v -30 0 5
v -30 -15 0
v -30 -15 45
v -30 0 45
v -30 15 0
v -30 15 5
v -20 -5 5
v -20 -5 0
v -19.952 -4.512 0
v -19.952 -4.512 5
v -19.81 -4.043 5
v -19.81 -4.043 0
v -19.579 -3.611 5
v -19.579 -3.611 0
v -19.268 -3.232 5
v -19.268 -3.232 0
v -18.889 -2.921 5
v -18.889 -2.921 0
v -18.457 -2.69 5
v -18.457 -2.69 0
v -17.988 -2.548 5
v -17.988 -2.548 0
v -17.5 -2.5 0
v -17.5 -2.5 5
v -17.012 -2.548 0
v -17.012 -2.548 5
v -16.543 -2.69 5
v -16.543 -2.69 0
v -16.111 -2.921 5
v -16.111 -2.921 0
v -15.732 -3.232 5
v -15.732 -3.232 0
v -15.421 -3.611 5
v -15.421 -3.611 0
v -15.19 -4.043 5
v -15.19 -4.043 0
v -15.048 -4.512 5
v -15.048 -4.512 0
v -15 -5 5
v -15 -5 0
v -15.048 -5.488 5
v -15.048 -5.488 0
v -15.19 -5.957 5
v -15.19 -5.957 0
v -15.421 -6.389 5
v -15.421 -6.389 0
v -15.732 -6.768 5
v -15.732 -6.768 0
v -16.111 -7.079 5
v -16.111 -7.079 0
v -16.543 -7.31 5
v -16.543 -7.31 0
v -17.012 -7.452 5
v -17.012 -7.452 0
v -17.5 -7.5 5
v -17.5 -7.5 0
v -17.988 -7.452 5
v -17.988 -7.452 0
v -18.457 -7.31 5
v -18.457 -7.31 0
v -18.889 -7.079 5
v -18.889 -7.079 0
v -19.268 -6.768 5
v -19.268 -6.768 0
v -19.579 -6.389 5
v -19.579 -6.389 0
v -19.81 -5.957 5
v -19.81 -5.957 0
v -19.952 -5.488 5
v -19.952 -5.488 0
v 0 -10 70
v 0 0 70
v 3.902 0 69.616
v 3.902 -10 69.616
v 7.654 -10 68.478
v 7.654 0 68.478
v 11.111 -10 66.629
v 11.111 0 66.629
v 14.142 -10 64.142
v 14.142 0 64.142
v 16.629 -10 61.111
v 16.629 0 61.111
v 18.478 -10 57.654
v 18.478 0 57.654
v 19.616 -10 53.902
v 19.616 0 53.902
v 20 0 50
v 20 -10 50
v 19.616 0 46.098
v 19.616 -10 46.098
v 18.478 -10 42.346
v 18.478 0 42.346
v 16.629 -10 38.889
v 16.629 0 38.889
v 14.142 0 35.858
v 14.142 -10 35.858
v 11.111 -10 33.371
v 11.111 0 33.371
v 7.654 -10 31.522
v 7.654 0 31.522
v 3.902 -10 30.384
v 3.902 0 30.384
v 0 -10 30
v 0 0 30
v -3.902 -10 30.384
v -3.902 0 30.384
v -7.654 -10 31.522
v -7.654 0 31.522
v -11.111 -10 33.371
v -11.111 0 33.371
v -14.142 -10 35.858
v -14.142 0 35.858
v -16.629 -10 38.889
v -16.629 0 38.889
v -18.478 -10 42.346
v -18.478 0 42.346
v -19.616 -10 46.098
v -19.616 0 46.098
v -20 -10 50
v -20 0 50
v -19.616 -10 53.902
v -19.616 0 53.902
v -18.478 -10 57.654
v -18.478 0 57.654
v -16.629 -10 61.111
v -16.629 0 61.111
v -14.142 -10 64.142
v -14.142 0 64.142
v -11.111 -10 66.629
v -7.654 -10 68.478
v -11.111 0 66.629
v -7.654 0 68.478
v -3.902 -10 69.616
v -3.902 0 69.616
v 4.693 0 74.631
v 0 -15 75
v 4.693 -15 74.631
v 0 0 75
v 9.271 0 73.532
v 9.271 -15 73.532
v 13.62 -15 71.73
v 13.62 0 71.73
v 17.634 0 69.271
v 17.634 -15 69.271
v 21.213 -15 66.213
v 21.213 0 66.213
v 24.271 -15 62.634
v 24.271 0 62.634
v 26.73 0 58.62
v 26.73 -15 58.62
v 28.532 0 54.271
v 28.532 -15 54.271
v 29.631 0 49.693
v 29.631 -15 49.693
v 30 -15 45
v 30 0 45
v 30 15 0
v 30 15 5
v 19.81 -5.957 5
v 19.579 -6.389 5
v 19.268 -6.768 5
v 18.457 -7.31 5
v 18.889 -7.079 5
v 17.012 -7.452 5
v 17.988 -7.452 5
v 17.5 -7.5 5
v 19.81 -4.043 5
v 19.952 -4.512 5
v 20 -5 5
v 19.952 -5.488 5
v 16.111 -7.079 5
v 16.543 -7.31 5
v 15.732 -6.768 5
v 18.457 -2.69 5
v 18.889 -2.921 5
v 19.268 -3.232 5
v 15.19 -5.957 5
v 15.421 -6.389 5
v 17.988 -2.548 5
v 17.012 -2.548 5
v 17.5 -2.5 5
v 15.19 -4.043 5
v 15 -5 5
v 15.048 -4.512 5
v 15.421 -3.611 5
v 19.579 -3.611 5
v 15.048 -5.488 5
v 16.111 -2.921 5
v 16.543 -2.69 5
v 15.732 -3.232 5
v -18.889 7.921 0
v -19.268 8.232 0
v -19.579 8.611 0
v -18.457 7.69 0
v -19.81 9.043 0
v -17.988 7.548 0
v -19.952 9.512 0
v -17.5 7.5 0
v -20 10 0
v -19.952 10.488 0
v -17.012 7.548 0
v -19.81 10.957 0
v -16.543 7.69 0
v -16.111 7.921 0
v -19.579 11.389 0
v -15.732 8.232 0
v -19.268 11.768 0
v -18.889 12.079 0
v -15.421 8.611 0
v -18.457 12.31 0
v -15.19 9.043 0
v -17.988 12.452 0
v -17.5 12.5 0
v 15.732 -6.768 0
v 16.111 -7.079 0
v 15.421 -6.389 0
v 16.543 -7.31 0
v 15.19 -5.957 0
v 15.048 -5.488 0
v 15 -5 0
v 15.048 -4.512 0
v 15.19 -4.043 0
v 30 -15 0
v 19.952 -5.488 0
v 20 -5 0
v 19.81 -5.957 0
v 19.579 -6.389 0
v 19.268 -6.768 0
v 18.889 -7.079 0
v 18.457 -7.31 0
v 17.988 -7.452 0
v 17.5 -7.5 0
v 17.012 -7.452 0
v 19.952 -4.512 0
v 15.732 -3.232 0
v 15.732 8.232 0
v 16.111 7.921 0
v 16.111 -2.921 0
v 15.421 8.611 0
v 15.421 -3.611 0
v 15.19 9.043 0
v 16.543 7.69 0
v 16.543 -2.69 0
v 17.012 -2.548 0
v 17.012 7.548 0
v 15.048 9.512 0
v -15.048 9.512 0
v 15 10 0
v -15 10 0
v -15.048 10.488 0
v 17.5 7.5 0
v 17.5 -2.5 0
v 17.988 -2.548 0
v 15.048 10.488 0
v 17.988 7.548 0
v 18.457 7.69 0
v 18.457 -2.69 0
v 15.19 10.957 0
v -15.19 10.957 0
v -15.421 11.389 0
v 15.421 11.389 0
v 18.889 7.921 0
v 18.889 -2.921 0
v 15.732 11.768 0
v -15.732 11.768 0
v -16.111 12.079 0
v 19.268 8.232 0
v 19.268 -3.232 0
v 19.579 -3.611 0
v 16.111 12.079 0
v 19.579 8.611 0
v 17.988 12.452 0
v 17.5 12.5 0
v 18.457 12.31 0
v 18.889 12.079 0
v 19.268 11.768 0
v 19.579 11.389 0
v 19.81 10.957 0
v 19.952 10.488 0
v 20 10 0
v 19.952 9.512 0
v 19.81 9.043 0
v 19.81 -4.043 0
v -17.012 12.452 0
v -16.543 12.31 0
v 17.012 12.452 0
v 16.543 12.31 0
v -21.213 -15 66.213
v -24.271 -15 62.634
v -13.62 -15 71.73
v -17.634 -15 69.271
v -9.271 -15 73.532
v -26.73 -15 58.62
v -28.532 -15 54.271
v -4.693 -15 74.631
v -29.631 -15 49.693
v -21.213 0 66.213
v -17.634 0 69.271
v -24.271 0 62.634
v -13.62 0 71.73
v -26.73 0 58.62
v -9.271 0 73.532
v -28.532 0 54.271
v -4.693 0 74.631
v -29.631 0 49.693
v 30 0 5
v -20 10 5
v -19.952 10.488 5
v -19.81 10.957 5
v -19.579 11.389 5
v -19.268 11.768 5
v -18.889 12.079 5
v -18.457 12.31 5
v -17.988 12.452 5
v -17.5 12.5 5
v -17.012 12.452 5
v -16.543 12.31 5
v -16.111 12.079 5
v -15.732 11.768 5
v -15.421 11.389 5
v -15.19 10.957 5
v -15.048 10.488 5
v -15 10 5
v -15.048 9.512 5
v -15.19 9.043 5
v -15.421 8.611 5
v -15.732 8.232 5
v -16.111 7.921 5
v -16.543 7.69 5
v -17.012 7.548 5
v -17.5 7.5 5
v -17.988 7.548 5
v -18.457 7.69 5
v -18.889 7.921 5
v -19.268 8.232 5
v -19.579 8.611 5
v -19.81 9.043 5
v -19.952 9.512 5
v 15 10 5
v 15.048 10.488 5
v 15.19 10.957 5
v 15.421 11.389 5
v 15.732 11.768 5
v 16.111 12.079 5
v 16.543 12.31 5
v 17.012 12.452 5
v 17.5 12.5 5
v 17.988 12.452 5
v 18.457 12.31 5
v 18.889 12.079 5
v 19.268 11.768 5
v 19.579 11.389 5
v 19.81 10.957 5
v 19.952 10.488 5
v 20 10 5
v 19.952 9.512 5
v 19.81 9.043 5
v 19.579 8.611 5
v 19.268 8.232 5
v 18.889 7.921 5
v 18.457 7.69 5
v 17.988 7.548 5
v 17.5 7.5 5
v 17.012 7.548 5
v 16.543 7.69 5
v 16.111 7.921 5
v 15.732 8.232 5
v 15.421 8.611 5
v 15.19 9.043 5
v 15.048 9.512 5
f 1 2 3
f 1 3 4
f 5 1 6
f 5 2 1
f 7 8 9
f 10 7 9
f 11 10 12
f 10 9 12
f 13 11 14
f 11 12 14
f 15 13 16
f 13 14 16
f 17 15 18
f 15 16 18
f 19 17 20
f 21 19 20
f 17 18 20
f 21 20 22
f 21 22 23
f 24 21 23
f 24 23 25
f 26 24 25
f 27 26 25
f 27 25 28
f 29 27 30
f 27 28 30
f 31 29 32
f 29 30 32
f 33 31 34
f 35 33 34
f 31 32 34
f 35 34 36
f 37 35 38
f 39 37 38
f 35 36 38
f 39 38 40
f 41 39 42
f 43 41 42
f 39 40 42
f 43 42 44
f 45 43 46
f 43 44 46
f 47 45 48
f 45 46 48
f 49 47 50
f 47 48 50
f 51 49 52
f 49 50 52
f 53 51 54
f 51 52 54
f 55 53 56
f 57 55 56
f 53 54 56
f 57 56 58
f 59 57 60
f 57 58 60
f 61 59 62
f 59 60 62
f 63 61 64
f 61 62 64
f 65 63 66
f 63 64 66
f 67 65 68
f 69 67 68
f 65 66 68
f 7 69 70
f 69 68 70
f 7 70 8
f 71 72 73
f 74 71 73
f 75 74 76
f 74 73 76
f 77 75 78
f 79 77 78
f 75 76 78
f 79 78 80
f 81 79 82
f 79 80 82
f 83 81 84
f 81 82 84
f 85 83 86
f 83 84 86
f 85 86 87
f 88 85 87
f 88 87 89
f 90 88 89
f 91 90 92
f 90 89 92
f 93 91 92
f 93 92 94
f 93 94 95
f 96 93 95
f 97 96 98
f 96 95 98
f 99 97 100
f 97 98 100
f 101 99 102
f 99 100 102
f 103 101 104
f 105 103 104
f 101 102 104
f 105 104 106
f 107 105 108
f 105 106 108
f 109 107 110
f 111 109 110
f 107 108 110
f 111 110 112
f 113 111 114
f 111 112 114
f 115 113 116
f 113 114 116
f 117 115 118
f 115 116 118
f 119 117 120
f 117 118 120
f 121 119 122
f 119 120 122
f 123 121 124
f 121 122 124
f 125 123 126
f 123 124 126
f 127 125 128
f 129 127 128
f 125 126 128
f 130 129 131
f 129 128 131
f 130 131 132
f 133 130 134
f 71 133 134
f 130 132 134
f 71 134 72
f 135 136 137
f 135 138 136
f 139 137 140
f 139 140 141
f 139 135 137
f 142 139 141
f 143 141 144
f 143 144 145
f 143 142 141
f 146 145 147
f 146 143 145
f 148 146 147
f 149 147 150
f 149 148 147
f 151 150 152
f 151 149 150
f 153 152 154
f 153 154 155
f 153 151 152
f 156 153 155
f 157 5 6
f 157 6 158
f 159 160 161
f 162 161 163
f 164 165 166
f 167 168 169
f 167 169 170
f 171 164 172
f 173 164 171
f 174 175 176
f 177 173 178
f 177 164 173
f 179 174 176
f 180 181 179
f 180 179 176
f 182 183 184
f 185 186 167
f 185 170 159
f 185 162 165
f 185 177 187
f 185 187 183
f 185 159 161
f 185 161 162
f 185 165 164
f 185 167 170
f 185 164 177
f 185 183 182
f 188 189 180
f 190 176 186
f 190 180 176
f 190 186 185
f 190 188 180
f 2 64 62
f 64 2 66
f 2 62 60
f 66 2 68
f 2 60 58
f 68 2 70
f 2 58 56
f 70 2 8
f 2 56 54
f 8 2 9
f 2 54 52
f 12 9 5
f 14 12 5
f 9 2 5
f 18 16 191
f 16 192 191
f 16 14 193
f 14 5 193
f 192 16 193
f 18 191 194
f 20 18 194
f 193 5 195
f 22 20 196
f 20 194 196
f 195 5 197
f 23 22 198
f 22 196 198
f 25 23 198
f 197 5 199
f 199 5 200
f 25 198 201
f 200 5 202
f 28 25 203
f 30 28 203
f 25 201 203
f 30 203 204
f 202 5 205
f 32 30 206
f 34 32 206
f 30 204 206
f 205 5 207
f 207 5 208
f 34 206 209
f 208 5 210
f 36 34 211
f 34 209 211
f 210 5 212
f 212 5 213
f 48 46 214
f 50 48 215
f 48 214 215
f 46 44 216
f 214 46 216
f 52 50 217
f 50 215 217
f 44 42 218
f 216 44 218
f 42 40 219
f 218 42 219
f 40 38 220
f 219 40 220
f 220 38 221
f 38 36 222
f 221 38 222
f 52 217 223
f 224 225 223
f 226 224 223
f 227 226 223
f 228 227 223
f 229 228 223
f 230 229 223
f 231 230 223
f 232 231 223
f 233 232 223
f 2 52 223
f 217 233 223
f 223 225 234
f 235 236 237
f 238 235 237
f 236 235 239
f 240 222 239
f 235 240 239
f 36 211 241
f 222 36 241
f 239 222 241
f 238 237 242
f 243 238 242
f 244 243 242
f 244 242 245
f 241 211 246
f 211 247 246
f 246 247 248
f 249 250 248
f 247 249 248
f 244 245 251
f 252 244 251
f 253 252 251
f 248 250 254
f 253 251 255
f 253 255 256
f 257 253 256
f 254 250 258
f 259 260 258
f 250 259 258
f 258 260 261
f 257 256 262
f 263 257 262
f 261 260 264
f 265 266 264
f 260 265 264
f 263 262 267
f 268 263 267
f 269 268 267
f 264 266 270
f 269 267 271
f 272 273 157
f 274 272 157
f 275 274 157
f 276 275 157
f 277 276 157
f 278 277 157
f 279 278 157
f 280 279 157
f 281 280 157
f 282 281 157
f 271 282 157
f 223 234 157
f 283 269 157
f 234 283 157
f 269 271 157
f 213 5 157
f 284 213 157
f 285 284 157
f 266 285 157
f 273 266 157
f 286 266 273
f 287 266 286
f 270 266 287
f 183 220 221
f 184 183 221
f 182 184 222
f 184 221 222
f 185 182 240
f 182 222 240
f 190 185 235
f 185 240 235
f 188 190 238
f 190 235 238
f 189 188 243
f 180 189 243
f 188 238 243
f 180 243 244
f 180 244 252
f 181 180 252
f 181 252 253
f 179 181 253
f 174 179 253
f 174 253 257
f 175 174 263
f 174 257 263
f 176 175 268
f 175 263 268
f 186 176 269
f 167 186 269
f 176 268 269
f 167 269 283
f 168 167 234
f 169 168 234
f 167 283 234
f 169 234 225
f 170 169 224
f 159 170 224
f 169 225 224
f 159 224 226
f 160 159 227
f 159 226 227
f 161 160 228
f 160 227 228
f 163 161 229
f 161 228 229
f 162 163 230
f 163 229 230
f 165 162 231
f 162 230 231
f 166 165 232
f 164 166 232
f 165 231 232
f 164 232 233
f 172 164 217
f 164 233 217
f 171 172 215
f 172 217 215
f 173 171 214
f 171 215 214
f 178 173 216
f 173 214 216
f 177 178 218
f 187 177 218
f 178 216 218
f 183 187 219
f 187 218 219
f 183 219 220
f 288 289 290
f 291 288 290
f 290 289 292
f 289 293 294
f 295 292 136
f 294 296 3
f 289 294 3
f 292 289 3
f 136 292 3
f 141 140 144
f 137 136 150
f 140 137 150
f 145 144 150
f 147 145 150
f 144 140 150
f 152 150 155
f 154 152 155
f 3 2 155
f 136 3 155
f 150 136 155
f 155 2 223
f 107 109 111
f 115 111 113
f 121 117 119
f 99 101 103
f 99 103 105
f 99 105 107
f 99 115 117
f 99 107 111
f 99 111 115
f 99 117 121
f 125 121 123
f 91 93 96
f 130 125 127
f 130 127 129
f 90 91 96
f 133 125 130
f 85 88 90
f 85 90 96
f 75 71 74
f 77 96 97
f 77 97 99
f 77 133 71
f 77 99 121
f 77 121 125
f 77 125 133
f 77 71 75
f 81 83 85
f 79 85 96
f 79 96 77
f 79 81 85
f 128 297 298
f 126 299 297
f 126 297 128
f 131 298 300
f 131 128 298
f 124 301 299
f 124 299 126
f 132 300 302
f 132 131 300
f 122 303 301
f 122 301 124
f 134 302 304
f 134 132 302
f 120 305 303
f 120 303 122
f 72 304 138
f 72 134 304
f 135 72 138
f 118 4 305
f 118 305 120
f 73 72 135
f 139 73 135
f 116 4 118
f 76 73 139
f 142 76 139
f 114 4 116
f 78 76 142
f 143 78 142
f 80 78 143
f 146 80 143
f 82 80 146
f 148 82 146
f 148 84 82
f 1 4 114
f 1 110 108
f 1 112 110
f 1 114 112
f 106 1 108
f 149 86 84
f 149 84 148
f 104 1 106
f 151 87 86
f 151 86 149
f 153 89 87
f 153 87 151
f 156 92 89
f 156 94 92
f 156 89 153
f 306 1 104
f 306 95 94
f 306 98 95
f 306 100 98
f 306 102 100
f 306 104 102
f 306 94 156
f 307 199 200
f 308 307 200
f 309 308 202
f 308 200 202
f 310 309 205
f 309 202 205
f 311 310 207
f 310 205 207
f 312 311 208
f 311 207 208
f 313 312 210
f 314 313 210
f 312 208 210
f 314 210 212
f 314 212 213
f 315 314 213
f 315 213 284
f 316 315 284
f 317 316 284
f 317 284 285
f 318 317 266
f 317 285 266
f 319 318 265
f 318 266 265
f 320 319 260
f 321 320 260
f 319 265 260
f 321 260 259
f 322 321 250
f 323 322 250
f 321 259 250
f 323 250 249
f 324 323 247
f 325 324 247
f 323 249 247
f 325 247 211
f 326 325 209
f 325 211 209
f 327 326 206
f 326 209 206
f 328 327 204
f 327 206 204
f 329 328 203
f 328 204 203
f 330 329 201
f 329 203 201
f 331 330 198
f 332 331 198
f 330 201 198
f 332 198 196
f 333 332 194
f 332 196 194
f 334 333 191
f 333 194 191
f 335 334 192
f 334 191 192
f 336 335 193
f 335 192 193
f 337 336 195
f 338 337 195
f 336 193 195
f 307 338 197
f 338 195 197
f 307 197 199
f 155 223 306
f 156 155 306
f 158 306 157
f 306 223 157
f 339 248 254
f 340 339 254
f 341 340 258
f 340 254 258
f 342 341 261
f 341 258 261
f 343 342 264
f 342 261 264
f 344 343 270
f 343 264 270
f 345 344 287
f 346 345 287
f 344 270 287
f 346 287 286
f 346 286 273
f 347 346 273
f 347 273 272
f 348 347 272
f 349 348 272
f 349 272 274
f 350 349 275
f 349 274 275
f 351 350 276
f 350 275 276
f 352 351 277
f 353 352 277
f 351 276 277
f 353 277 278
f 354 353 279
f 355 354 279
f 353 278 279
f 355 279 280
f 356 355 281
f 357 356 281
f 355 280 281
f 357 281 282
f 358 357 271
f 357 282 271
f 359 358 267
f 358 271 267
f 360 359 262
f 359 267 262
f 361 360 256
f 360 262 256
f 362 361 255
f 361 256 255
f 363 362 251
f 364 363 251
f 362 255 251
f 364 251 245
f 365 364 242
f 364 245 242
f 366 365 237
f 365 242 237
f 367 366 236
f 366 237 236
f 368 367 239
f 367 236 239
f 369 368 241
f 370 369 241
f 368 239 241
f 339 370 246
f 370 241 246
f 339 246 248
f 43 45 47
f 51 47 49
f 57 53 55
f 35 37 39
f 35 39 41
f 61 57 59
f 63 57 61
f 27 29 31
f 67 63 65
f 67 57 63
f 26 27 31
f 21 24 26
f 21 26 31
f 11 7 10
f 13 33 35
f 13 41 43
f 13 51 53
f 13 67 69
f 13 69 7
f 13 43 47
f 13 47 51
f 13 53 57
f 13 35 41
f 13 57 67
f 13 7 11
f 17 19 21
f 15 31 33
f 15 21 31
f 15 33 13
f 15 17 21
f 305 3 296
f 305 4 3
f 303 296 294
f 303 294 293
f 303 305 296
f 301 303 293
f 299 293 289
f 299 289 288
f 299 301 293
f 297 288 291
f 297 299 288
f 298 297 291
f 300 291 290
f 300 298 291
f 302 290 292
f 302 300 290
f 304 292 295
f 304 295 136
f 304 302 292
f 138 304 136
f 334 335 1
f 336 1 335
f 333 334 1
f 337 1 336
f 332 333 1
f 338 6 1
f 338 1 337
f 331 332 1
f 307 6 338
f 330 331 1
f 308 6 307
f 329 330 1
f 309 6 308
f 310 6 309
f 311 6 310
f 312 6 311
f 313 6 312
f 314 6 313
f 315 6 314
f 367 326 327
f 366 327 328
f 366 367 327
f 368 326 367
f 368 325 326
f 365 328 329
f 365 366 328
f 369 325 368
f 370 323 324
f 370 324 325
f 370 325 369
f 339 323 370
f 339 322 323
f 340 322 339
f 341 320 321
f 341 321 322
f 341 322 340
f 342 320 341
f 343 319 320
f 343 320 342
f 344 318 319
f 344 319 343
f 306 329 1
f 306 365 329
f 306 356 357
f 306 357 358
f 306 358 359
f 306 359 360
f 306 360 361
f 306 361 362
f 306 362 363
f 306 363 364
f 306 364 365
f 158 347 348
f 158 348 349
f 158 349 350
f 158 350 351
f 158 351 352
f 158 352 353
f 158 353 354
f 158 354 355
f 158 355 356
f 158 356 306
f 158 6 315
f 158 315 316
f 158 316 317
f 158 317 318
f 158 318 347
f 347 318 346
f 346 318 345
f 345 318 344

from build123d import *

# Parameters (mm, degrees)
SKETCH1_W           = 60
SKETCH1_H           = 30
BOSS_EXTRUDE1_DEPTH = 5
SKETCH2_W           = 60
SKETCH2_H           = 15
BOSS_EXTRUDE2_DEPTH = 70
SKETCH3_R           = 20
CUT_EXTRUDE1_DEPTH  = 10
SKETCH4_R           = 2.5
CUT_EXTRUDE2_DEPTH  = 5
FILLET1_R           = 30


with BuildPart() as part:
    # Sketch1 → Boss-Extrude1 (new body)
    with BuildSketch(Plane.XY):
        Rectangle(SKETCH1_W, SKETCH1_H)
    extrude(amount=BOSS_EXTRUDE1_DEPTH)

    # Sketch2 → Boss-Extrude2 (add)
    with BuildSketch(Plane.XY.offset(5)):
        with Locations((0, -7.5)):
            Rectangle(SKETCH2_W, SKETCH2_H)
    extrude(amount=BOSS_EXTRUDE2_DEPTH)

    # Sketch3 → Cut-Extrude1 (cut)
    with BuildSketch(Plane(origin=(0, 0, 0), x_dir=(1, 0, 0), z_dir=(0, 1, 0))):
        with Locations(Location((0, -50, 0), (0, 0, 270))):
            Circle(SKETCH3_R)
    extrude(amount=-CUT_EXTRUDE1_DEPTH, mode=Mode.SUBTRACT)

    # Sketch4 → Cut-Extrude2 (cut)
    with BuildSketch(Plane(origin=(0, 0, 0), x_dir=(-1, 0, 0), z_dir=(0, 0, -1))):
        with Locations((-17.5, 10)):
            Circle(SKETCH4_R)
        with Locations((17.5, 10)):
            Circle(SKETCH4_R)
        with Locations((17.5, -5)):
            Circle(SKETCH4_R)
        with Locations((-17.5, -5)):
            Circle(SKETCH4_R)
    extrude(amount=-CUT_EXTRUDE2_DEPTH, mode=Mode.SUBTRACT)

    # Fillet1
    fillet1_edges = [part.edges().sort_by_distance(p)[0] for p in [
        (30, -7.5, 75),
        (-30, -7.5, 75),
    ]]
    fillet(fillet1_edges, radius=FILLET1_R - 0.0001)  # a hair under: the kernel refuses the full size


solid = part.part
